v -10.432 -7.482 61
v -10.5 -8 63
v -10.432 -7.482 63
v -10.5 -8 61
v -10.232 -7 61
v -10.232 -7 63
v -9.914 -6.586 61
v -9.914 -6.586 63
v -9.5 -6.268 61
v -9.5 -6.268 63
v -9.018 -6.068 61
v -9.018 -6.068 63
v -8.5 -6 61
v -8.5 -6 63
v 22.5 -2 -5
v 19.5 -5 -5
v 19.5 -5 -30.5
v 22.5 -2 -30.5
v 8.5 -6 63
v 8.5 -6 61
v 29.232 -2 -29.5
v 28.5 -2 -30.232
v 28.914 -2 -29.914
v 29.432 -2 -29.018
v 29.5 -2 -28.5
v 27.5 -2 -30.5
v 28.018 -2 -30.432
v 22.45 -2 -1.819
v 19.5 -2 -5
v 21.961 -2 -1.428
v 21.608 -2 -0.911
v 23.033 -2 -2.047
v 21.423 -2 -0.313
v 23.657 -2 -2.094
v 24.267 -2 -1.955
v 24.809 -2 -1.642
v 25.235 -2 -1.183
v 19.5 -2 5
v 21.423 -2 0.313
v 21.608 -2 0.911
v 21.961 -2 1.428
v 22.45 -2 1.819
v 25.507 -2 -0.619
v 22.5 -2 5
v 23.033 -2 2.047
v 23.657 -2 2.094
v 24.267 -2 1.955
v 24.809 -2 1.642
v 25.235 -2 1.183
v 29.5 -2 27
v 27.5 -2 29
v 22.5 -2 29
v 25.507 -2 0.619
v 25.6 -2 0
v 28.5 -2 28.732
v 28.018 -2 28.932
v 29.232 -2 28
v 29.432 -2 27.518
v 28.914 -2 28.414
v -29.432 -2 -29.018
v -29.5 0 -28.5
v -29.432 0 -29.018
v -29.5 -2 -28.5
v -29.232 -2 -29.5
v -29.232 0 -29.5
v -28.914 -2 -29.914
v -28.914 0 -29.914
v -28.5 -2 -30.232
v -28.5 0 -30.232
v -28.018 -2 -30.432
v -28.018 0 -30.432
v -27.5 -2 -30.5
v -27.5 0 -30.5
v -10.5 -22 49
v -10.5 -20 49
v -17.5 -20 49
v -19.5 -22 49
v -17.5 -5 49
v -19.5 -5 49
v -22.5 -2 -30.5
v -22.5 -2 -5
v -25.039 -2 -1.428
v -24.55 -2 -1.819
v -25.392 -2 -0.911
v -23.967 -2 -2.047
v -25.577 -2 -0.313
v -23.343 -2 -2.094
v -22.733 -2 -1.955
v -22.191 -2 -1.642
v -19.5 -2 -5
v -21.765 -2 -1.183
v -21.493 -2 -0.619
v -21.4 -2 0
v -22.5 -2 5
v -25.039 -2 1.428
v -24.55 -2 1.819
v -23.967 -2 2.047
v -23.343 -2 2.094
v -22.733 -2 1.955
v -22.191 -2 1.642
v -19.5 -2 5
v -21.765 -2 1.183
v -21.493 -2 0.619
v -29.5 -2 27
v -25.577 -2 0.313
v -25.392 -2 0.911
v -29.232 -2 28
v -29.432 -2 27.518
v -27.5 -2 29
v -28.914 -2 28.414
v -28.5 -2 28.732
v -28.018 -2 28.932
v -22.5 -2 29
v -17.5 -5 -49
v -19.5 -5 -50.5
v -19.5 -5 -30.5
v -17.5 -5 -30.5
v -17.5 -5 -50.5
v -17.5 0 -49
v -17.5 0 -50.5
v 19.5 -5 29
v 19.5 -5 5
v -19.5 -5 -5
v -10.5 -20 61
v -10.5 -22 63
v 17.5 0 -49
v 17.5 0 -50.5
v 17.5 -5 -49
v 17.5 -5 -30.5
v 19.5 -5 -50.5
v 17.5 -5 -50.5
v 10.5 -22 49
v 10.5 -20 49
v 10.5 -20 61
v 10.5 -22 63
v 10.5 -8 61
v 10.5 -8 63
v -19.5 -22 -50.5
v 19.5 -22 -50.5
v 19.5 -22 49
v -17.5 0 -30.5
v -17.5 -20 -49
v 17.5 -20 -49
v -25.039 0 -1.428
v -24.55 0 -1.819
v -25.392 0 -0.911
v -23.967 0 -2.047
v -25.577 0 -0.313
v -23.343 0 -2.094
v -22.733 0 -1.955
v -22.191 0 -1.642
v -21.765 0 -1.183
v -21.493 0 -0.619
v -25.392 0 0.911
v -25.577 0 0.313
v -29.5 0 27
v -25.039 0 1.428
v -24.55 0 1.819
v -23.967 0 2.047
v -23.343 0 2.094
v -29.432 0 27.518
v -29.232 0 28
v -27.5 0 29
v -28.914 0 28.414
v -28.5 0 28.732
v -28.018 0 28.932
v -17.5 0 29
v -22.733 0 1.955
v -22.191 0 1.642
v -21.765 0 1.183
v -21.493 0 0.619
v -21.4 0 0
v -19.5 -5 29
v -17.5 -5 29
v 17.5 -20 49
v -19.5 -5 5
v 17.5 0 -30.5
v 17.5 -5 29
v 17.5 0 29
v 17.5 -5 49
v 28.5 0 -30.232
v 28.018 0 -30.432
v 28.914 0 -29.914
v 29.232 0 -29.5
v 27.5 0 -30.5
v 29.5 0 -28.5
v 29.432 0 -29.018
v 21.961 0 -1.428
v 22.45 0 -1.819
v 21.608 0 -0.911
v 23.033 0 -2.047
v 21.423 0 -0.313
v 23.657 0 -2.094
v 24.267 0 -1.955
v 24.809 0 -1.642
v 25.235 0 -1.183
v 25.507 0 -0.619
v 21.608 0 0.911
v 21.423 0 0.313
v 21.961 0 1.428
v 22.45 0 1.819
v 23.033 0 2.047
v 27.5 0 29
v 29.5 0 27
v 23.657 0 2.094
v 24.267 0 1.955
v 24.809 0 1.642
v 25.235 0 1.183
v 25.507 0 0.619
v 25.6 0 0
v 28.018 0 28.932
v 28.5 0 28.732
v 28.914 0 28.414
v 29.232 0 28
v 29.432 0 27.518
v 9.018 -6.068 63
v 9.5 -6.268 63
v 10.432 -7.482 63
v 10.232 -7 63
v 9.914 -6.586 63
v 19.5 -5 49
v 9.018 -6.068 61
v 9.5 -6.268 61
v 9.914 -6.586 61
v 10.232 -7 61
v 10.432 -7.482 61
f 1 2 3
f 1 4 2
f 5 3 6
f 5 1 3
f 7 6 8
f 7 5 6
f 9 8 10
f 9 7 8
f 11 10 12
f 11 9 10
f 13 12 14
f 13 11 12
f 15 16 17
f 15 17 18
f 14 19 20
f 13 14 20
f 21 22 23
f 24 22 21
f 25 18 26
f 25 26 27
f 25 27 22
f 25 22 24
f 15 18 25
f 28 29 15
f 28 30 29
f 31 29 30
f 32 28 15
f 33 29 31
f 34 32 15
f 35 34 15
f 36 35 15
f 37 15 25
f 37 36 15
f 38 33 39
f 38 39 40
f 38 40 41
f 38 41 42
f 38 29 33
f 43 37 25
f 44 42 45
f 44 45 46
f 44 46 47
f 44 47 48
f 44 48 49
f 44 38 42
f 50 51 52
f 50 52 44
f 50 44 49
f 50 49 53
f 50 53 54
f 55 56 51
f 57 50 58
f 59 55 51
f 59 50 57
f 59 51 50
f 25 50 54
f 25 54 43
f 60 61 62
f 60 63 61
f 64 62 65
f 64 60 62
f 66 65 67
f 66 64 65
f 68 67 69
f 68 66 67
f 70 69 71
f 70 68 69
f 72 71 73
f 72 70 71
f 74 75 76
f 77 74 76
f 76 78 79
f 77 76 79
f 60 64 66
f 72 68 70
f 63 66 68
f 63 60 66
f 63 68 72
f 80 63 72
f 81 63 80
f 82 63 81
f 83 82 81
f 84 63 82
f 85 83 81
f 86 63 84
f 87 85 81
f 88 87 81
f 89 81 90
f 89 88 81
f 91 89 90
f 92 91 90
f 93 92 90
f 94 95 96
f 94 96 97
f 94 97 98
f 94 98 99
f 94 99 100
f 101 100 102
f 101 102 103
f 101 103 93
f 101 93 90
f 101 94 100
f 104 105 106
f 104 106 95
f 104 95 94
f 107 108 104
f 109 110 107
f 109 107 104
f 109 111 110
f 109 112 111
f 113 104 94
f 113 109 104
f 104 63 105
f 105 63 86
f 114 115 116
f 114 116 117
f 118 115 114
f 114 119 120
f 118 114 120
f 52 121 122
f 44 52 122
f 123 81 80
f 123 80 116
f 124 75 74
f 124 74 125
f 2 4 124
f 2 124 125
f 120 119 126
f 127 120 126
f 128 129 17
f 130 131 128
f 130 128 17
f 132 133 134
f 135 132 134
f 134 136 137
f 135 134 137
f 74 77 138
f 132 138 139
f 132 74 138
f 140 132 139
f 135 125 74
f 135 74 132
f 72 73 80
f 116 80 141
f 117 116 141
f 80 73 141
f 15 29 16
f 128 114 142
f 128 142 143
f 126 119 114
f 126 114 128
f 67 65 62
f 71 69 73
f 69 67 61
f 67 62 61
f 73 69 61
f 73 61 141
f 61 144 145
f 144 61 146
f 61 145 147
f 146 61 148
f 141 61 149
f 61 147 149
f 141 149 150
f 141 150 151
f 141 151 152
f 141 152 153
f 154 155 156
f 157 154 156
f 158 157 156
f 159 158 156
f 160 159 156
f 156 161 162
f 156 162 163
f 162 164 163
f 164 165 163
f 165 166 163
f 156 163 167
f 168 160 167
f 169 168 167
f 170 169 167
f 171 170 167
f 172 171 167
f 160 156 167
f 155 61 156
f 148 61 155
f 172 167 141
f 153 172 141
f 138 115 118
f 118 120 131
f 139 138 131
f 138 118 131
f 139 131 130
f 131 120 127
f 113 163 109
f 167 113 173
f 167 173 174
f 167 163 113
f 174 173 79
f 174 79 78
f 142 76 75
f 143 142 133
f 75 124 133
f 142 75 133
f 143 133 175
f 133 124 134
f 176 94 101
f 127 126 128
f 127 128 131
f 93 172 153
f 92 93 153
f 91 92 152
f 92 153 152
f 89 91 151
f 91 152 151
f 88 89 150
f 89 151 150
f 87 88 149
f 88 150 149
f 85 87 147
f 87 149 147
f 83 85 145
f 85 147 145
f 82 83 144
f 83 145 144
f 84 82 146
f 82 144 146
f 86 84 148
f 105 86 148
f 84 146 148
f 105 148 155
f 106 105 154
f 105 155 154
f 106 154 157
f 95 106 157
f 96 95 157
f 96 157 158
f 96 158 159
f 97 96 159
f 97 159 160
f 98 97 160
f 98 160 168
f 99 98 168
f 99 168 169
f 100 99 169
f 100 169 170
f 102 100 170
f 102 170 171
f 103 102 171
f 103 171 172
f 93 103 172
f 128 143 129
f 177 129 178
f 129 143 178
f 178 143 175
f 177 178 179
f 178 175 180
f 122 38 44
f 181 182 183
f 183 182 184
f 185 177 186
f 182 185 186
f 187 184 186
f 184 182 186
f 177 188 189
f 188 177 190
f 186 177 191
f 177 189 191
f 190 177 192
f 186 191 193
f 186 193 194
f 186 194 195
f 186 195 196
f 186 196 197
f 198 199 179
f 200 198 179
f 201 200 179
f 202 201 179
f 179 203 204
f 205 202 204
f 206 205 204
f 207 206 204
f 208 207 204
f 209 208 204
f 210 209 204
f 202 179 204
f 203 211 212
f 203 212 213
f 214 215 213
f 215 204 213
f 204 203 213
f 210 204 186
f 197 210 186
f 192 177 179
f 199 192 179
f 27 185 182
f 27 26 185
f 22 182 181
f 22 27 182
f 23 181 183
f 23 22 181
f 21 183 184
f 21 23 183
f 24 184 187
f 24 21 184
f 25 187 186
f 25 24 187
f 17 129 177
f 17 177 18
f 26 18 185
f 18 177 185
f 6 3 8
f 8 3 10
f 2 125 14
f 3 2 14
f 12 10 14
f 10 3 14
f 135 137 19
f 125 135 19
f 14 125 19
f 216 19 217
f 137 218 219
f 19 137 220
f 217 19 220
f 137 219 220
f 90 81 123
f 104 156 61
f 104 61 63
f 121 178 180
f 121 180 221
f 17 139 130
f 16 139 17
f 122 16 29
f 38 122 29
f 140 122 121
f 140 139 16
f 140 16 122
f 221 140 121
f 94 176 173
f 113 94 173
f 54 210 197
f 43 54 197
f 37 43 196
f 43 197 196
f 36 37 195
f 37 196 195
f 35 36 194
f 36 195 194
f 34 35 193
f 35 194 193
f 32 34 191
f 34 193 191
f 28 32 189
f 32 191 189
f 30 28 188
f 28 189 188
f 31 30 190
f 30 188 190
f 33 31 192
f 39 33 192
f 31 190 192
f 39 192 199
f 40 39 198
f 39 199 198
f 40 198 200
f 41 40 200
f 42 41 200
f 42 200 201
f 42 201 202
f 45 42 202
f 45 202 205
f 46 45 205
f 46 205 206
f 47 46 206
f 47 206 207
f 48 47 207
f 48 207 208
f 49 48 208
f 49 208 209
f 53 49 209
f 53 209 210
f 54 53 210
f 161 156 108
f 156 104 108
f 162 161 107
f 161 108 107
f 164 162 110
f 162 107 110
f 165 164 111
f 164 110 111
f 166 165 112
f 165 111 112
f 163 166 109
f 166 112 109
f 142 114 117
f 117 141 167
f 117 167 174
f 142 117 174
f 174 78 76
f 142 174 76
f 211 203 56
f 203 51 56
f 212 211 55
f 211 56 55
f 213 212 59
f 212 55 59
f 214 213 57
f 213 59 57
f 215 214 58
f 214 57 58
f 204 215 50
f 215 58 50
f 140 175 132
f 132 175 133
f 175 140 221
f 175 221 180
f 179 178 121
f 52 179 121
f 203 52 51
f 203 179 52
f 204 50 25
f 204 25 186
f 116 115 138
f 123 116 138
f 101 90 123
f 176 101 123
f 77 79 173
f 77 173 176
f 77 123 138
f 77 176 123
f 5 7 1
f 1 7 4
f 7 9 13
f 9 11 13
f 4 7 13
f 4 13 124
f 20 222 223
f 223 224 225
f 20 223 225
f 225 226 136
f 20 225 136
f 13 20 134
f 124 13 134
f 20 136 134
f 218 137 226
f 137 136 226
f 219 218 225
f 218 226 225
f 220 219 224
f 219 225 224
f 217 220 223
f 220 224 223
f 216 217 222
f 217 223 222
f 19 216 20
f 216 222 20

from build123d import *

# Parameters (mm, degrees)
BOSS_EXTRUDE1_DEPTH = 49
BOSS_EXTRUDE3_DEPTH = 10.5
CHAMFER1_SIZE       = 3
SKETCH4_R           = 2.1
CUT_EXTRUDE1_DEPTH  = 23
SKETCH5_W           = 8
SKETCH5_H           = 10
CUT_EXTRUDE2_DEPTH  = 21
BOSS_EXTRUDE5_DEPTH = 1.5
SKETCH6_W           = 12
SKETCH6_H           = 20
CUT_EXTRUDE3_DEPTH  = 5
FILLET1_R           = 2


with BuildPart() as part:
    # Sketch1 → Boss-Extrude1 (new body, symmetric)
    with BuildSketch(Plane.XY):
        Polygon((-29.5, 0), (-17.5, 0), (-17.5, -20), (17.5, -20), (17.5, 0), (29.5, 0), (29.5, -2), (19.5, -2), (19.5, -22), (-19.5, -22), (-19.5, -2), (-29.5, -2), align=None)
    extrude(amount=BOSS_EXTRUDE1_DEPTH, both=True)

    # Sketch3 → Boss-Extrude3 (add, symmetric)
    with BuildSketch(Plane(origin=(0, 0, 0), x_dir=(0, 0, -1), z_dir=(1, 0, 0))):
        Polygon((-49, -22), (-63, -22), (-63, -6), (-61, -6), (-61, -20), (-49, -20), align=None)
    extrude(amount=BOSS_EXTRUDE3_DEPTH, both=True)

    # Chamfer1
    chamfer1_edges = [part.edges().sort_by_distance(p)[0] for p in [
        (19.5, -2, 0),
        (-19.5, -2, 0),
    ]]
    chamfer(chamfer1_edges, length=CHAMFER1_SIZE)

    # Sketch4 → Cut-Extrude1 (cut, through all)
    with BuildSketch(Plane(origin=(0, 0, 0), x_dir=(1, 0, 0), z_dir=(0, 1, 0))):
        with Locations((-23.5, 0)):
            Circle(SKETCH4_R)
        with Locations((23.5, 0)):
            Circle(SKETCH4_R)
    extrude(amount=-CUT_EXTRUDE1_DEPTH, mode=Mode.SUBTRACT)

    # Sketch5 → Cut-Extrude2 (cut, through all)
    with BuildSketch(Plane.XZ.offset(2)):
        with Locations((23.5, 0)):
            Rectangle(SKETCH5_W, SKETCH5_H)
        with Locations((-23.5, 0)):
            Rectangle(SKETCH5_W, SKETCH5_H)
    extrude(amount=CUT_EXTRUDE2_DEPTH, mode=Mode.SUBTRACT)

    # Sketch2 → Boss-Extrude5 (add)
    with BuildSketch(Plane(origin=(0, 0, -49), x_dir=(-1, 0, 0), z_dir=(0, 0, -1))):
        Polygon((-17.5, 0), (17.5, 0), (29.5, 0), (29.5, -2), (22.5, -2), (19.5, -5), (19.5, -22), (-19.5, -22), (-19.5, -5), (-22.5, -2), (-29.5, -2), (-29.5, 0), align=None)
    extrude(amount=BOSS_EXTRUDE5_DEPTH)

    # Sketch6 → Cut-Extrude3 (cut)
    with BuildSketch(Plane(origin=(0, 0, 0), x_dir=(1, 0, 0), z_dir=(0, 1, 0))):
        with Locations((-23.5, -39)):
            Rectangle(SKETCH6_W, SKETCH6_H)
        with Locations((23.5, -39)):
            Rectangle(SKETCH6_W, SKETCH6_H)
        with Locations((23.5, 40.5)):
            Rectangle(SKETCH6_W, SKETCH6_H)
        with Locations((-23.5, 40.5)):
            Rectangle(SKETCH6_W, SKETCH6_H)
    extrude(amount=-CUT_EXTRUDE3_DEPTH, mode=Mode.SUBTRACT)

    # Fillet1
    fillet1_edges = [part.edges().sort_by_distance(p)[0] for p in [
        (-29.5, -1, -30.5),
        (29.5, -1, -30.5),
        (29.5, -1, 29),
        (-29.5, -1, 29),
        (-10.5, -6, 62),
        (10.5, -6, 62),
    ]]
    fillet(fillet1_edges, radius=FILLET1_R)


solid = part.part
